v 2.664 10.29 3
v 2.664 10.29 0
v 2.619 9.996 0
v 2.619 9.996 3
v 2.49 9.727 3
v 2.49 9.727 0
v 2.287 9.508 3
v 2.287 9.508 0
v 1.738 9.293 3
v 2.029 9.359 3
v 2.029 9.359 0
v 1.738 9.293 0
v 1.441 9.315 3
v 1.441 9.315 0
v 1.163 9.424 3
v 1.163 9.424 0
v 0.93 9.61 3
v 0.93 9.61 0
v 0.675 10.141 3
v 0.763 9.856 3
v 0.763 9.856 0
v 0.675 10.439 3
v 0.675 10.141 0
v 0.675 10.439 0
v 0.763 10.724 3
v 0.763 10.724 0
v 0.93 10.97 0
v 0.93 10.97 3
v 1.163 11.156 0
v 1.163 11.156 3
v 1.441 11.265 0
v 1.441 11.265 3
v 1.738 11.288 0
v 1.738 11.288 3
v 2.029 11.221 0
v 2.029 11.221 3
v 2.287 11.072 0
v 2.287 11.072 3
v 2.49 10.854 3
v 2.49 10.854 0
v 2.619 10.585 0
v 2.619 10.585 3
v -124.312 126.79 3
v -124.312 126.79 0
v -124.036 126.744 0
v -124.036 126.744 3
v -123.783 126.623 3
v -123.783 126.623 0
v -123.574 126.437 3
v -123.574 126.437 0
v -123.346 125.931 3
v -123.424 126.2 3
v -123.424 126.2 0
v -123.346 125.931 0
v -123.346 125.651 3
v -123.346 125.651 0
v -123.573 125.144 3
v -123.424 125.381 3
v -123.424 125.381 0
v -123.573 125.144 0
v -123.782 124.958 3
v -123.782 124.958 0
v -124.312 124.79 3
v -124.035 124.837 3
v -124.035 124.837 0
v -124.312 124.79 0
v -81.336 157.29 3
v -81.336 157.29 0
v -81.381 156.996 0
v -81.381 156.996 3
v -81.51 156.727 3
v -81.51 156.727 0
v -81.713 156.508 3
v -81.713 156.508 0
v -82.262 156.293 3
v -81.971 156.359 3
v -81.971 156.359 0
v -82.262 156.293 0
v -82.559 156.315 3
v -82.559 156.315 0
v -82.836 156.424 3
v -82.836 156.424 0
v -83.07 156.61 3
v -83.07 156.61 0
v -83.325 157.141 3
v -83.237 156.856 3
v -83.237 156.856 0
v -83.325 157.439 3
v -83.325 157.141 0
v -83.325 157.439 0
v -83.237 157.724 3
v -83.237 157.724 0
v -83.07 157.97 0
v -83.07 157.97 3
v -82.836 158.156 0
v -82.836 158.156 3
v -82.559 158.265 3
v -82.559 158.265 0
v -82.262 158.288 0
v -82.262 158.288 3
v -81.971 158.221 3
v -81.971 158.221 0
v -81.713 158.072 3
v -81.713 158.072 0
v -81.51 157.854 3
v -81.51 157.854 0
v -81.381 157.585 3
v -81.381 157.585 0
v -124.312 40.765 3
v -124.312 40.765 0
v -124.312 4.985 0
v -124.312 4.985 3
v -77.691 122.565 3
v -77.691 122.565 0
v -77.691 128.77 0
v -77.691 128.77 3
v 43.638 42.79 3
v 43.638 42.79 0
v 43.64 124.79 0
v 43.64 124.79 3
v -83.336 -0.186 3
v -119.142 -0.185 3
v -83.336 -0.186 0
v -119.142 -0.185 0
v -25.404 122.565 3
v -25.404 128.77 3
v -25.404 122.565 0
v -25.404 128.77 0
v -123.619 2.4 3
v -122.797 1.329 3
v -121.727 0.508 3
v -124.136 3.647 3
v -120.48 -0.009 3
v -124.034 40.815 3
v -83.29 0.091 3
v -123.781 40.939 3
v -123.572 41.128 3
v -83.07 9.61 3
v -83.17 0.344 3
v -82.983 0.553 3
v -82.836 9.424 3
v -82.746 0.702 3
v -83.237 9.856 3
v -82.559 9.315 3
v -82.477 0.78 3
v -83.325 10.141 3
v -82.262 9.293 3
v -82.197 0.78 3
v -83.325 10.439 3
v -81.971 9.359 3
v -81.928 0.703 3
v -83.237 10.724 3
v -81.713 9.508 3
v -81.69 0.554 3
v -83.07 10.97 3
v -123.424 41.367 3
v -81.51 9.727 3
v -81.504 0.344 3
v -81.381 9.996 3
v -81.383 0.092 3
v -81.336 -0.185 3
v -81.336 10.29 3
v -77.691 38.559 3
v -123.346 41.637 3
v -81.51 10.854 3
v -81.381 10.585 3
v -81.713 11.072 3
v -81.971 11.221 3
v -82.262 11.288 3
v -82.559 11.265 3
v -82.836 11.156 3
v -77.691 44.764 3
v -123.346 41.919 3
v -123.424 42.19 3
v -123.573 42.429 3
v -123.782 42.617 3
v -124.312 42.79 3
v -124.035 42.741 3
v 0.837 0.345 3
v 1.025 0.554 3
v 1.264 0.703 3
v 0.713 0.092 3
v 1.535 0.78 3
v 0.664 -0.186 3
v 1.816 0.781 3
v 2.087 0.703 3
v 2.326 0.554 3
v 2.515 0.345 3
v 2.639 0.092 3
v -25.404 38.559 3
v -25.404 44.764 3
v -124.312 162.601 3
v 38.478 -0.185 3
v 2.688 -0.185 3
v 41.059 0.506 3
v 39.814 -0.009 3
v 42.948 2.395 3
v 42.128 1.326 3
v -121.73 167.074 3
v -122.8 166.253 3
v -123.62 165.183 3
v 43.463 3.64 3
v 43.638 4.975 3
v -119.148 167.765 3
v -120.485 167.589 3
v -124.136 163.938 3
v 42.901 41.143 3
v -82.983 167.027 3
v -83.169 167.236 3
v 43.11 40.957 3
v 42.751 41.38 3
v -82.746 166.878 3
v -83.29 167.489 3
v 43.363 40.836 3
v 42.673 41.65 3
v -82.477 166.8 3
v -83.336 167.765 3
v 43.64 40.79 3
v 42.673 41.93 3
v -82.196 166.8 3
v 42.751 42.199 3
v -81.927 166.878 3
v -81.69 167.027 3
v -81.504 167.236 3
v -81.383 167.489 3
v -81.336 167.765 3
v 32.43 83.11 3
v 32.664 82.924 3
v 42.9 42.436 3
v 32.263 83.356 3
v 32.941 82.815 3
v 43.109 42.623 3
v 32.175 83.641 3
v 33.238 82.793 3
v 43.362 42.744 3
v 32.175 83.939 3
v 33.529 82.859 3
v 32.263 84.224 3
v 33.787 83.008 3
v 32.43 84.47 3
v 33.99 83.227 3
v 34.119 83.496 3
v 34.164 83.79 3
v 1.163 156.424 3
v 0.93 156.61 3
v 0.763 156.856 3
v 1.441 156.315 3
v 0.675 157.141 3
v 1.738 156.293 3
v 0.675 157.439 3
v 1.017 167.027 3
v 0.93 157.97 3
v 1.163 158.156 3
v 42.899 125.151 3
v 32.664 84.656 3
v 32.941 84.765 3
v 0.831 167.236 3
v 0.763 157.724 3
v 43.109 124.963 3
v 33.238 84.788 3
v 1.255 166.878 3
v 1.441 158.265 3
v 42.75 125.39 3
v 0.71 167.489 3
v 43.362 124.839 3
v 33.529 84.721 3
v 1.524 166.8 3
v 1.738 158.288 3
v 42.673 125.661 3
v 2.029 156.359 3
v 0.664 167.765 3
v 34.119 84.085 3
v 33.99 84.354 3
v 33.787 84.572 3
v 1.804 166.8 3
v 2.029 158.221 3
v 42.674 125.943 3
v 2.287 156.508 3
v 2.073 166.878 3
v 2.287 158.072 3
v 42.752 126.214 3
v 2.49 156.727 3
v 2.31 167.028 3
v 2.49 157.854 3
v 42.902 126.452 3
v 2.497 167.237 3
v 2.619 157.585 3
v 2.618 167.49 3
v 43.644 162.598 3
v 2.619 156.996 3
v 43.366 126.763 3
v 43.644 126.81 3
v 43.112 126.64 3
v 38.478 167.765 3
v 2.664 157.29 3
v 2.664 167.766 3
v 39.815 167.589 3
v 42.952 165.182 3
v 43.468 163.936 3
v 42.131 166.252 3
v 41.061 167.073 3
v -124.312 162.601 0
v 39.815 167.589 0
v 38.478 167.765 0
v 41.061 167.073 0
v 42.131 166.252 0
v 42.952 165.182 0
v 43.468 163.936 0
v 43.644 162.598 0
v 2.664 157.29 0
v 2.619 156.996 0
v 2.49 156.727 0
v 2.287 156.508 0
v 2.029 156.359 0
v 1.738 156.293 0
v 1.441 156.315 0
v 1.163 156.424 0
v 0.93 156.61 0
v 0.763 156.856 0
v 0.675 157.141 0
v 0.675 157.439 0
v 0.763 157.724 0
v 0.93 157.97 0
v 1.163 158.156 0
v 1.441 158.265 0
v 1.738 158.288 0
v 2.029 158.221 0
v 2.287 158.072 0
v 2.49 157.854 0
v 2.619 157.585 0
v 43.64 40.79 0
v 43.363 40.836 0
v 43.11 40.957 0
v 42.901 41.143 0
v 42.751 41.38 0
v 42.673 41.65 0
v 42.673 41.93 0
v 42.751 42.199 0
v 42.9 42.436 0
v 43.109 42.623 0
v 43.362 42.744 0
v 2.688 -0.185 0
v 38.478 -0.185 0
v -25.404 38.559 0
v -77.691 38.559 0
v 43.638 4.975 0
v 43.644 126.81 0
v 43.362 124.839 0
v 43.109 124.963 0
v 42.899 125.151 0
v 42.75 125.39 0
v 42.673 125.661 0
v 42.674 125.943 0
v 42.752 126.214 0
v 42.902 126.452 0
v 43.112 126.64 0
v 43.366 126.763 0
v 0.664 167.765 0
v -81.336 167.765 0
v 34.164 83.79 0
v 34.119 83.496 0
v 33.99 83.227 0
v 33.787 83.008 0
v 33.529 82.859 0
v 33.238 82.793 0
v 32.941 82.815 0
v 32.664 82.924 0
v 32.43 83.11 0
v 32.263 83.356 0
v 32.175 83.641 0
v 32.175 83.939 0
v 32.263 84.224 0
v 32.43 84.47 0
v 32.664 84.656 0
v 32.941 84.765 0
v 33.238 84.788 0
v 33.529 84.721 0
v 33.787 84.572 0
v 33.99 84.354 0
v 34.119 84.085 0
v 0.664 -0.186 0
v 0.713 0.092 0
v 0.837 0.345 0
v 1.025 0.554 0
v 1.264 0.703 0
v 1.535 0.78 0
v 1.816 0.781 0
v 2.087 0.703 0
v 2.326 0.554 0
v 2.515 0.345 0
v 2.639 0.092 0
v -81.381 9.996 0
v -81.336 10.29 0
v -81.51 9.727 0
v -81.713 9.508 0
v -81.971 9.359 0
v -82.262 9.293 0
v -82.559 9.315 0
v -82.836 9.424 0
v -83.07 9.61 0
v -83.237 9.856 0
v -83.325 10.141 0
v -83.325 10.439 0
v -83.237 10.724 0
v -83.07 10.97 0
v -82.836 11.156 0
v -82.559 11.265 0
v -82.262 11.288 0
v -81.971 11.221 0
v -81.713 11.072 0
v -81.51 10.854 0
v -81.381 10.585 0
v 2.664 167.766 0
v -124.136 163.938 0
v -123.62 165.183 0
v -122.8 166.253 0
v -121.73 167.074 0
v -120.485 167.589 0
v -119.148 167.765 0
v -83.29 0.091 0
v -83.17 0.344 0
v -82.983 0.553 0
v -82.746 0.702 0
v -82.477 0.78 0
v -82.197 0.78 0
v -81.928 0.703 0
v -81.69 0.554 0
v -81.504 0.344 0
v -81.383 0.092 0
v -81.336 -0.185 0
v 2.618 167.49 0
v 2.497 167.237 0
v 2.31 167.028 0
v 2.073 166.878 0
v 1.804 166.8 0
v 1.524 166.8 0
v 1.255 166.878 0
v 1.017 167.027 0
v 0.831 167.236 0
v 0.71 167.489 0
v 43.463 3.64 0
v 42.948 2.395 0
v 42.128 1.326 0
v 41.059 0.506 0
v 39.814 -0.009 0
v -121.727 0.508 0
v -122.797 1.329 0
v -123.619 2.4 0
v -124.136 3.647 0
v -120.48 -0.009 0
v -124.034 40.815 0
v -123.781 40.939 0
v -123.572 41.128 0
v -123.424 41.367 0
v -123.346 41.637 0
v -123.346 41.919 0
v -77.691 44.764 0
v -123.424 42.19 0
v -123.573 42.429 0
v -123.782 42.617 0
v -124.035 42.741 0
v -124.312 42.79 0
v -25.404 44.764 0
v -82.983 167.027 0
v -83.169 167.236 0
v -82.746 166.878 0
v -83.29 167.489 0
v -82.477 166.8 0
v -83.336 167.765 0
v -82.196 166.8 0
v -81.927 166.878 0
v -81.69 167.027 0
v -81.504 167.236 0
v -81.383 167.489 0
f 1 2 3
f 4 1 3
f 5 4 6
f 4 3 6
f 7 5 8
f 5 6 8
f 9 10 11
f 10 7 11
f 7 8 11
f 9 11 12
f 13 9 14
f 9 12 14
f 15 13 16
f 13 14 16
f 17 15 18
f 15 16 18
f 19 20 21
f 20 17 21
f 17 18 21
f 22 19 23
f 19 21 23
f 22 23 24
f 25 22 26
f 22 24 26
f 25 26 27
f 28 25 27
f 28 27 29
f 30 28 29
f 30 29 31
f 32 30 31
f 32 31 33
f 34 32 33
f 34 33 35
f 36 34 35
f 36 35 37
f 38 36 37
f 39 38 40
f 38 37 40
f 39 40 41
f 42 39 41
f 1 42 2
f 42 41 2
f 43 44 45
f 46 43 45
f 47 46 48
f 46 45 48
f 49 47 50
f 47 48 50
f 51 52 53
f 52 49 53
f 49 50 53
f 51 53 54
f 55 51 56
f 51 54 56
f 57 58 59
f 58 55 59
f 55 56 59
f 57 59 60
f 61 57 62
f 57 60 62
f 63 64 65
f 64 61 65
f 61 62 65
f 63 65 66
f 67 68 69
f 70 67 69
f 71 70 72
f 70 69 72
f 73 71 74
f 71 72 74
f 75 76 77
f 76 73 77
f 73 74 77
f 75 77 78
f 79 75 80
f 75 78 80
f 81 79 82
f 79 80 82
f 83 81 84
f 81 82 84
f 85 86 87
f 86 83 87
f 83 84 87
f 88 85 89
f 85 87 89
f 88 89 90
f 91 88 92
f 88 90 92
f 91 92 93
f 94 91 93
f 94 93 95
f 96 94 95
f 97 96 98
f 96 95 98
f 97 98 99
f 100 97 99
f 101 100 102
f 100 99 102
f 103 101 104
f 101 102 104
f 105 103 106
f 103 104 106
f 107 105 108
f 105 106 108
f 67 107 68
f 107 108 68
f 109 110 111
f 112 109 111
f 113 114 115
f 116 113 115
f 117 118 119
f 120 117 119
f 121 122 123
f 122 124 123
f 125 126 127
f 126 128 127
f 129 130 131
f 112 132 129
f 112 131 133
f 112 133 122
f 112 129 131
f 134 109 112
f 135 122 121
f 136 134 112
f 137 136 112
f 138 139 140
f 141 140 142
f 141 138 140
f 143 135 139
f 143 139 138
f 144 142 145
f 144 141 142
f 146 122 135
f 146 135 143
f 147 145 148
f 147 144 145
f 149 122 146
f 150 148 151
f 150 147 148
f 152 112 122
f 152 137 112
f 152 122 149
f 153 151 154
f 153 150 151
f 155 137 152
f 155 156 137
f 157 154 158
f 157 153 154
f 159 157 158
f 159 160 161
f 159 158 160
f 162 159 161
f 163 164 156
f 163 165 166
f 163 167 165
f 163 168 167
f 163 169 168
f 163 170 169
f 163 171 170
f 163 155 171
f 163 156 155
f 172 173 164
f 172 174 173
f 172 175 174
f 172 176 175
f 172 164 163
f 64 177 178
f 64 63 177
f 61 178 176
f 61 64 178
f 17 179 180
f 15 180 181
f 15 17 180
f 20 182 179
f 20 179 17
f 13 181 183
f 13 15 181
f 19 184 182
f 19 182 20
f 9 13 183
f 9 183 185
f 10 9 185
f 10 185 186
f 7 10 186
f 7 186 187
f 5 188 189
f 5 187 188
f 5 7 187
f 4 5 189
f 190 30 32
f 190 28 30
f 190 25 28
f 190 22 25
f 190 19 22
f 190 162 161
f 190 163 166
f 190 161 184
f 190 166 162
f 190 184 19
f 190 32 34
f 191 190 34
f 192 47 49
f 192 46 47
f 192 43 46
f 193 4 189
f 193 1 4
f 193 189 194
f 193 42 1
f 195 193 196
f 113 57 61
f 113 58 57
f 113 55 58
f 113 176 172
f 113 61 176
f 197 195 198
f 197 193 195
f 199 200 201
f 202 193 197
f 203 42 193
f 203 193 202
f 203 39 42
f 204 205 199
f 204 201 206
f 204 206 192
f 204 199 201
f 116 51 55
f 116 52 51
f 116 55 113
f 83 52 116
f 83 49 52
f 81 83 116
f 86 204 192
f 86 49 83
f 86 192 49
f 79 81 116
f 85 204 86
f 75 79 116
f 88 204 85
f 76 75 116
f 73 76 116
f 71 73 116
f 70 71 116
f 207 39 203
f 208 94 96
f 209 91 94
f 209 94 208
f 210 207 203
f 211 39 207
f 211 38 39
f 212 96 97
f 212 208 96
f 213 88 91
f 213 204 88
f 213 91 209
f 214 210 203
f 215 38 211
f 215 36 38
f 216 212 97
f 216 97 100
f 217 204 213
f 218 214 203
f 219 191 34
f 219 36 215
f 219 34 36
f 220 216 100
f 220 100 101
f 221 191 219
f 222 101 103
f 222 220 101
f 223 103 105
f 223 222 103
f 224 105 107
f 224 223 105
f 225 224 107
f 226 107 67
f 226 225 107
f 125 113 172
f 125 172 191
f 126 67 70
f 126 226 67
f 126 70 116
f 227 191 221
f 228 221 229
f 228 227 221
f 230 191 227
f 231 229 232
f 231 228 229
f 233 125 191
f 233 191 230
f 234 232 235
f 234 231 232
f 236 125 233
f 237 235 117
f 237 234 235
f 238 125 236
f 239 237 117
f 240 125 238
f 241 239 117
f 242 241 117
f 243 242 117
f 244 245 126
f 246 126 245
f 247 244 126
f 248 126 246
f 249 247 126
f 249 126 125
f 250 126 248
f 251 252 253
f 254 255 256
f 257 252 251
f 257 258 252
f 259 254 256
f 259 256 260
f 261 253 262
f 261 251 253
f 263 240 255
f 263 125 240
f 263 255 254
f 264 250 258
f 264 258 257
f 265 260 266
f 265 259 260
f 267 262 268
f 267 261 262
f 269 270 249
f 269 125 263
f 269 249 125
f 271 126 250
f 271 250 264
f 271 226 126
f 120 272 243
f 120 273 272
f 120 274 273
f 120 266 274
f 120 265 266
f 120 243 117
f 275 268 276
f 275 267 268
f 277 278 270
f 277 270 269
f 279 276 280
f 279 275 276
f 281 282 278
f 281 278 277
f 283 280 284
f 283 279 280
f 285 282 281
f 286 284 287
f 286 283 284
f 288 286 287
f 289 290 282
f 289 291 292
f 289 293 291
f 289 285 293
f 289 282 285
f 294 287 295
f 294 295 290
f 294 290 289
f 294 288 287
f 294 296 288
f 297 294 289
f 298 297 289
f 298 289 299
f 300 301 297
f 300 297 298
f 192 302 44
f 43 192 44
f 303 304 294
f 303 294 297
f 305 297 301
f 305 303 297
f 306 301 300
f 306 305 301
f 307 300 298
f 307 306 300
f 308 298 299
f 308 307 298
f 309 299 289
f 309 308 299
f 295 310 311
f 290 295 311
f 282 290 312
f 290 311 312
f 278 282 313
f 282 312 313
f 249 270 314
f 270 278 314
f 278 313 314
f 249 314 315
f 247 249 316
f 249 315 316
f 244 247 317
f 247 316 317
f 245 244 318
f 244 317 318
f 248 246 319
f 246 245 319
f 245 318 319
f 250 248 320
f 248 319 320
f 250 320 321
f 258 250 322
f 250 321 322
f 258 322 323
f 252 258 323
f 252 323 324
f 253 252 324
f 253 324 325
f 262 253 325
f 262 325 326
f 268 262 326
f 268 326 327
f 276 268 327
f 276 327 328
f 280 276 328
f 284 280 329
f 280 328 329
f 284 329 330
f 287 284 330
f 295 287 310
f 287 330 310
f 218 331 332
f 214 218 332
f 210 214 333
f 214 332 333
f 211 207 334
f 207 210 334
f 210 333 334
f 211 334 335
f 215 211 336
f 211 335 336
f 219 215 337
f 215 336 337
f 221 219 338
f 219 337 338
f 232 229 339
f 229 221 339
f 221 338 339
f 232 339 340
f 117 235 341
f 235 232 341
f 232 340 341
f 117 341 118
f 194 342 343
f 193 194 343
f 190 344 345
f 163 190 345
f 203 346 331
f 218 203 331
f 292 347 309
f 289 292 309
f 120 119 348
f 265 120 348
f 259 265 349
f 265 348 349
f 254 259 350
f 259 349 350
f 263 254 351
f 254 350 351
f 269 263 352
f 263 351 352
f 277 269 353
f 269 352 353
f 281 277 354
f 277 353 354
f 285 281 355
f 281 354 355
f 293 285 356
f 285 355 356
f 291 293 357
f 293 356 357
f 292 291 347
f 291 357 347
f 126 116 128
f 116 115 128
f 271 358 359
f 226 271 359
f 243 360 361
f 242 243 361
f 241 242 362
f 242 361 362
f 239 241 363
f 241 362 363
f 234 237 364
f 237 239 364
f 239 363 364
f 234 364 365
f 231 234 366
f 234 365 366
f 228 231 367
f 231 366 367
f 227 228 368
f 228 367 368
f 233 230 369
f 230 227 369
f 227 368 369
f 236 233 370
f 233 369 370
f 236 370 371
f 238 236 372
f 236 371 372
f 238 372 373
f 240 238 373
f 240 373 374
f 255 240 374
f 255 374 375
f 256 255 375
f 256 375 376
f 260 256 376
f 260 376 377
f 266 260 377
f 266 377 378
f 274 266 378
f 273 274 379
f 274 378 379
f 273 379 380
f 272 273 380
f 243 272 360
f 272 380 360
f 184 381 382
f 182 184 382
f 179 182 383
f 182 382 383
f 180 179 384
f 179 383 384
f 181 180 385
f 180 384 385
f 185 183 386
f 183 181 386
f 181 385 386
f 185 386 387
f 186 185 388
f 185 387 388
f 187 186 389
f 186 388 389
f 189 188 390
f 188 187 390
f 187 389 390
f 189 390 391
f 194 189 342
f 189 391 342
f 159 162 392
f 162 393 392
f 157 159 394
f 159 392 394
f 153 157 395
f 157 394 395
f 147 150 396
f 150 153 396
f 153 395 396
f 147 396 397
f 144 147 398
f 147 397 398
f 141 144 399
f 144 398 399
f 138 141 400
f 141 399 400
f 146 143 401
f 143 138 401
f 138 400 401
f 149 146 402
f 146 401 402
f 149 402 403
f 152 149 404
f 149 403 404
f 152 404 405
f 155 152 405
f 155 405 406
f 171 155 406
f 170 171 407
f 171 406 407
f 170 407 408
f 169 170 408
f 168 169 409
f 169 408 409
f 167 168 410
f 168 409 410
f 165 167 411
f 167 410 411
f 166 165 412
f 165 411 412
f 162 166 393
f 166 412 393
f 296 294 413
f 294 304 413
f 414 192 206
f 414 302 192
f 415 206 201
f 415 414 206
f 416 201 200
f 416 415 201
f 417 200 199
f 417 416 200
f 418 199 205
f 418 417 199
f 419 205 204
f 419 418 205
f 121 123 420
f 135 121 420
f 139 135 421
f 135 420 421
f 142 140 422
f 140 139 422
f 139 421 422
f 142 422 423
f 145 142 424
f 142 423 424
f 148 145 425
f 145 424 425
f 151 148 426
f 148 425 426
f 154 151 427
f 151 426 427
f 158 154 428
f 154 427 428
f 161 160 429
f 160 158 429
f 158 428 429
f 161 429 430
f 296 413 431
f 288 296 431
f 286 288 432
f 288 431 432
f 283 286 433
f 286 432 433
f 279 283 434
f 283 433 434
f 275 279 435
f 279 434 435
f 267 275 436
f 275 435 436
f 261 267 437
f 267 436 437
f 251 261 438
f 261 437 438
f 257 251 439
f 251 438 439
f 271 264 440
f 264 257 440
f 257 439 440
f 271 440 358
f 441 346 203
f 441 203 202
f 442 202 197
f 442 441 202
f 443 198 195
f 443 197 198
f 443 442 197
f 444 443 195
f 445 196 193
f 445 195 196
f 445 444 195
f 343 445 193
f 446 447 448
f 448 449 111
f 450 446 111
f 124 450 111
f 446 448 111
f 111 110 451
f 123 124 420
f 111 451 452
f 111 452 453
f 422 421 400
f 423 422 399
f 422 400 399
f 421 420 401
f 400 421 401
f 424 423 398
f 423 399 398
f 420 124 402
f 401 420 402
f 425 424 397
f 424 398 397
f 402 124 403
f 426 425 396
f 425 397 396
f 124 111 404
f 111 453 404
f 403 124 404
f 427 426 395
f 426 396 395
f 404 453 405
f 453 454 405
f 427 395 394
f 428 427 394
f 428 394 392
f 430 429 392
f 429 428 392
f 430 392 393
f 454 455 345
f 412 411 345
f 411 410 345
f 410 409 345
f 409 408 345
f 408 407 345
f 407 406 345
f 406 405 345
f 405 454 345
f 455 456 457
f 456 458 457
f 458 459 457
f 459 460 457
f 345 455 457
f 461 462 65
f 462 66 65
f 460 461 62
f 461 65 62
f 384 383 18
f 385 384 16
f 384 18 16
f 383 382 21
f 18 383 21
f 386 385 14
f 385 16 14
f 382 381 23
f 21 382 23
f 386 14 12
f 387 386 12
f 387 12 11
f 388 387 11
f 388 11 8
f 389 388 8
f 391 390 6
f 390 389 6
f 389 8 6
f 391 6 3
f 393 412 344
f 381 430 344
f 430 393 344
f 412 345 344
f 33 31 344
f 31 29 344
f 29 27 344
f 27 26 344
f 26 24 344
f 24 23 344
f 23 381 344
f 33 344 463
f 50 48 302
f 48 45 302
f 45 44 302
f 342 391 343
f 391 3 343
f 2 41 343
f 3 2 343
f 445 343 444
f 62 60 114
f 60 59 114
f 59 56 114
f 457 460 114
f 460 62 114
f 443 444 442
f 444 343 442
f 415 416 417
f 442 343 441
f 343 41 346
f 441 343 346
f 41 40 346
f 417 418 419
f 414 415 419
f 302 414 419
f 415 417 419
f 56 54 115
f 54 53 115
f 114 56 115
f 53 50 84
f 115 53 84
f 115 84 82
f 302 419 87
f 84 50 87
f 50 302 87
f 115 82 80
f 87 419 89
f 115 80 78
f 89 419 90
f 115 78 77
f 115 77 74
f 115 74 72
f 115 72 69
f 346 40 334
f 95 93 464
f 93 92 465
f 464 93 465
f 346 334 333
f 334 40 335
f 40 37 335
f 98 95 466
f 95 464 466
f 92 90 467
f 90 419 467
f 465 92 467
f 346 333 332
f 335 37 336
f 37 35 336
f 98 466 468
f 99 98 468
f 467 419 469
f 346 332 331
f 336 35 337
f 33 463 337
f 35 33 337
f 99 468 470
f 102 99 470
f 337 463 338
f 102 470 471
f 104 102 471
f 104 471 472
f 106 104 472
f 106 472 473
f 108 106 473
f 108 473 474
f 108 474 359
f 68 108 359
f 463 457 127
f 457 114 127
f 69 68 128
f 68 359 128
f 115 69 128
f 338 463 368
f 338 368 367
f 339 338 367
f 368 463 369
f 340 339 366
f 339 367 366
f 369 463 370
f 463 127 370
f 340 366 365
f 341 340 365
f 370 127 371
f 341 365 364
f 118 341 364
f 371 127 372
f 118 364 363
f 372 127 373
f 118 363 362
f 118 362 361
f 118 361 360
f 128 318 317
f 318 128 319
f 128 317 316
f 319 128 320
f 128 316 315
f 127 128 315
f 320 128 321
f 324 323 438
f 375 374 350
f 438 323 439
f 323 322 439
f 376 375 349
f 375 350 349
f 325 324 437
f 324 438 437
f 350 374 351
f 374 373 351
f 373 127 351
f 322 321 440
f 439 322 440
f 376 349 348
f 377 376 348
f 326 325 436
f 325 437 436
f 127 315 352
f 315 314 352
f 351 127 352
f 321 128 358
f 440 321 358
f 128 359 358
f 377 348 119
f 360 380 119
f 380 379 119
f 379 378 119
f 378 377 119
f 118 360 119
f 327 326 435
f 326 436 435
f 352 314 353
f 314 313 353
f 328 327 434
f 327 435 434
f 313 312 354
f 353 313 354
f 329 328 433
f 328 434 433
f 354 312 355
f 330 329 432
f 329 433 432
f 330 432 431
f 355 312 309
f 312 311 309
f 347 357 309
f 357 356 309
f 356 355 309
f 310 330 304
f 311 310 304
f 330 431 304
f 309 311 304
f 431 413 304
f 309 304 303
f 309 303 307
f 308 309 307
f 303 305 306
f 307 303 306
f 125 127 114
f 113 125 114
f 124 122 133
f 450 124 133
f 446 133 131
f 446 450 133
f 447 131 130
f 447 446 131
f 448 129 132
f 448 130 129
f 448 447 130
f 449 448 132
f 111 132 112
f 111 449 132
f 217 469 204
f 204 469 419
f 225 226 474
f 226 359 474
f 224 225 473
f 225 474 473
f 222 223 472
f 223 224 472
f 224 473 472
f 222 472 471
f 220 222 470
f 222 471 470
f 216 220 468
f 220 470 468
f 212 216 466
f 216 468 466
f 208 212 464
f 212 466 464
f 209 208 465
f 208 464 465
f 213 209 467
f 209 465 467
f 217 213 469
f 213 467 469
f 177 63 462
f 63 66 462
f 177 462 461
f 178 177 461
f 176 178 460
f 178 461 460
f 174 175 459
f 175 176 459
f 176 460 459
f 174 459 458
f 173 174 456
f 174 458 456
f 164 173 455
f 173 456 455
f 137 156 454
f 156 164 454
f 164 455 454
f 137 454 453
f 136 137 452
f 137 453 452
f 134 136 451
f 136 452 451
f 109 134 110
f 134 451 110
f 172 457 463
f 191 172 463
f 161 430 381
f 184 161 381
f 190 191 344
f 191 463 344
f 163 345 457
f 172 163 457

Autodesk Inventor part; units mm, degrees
ref_plane "YZ Plane" through (0, 0, 0) normal (1, 0, 0) x (0, 1, 0)
ref_plane "XZ Plane" through (0, 0, 0) normal (0, 1, 0) x (-1, 0, 0)
ref_plane "XY Plane" through (0, 0, 0) normal (0, 0, 1) x (1, 0, 0)
sketch "Sketch1" plane through (-41.0022, 83.9754, 0) normal (0, 0, 1) x (1, 0, 0)
  line L0 (43.6907, -84.1601) -> (79.4807, -84.1601)
  arc A0 (43.6907, -84.1601) -> (41.6657, -84.1611) centre (42.6783, -84.1982) ccw
  line L1 (-40.3343, -84.1601) -> (41.6657, -84.1611)
  arc A1 (-40.3343, -84.1601) -> (-42.3343, -84.1611) centre (-41.3342, -84.1854) ccw
  line L2 (-78.1393, -84.1601) -> (-42.3343, -84.1611)
  arc A2 (-83.3093, -78.9901) -> (-78.1393, -84.1601) centre (-78.1401, -78.9909) ccw
  line L3 (-83.3093, -43.2101) -> (-83.3093, -78.9901)
  arc A3 (-83.3093, -43.2101) -> (-83.3103, -41.1851) centre (-83.3474, -42.1976) ccw
  line L4 (-83.3093, 40.8149) -> (-83.3103, -41.1851)
  arc A4 (-83.3093, 40.8149) -> (-83.3103, 42.8149) centre (-83.3346, 41.8149) ccw
  line L5 (-83.3093, 78.6259) -> (-83.3103, 42.8149)
  arc A5 (-78.1463, 83.7899) -> (-83.3093, 78.6259) centre (-78.147, 78.6276) ccw
  line L6 (-42.3343, 83.7899) -> (-78.1463, 83.7899)
  arc A6 (-42.3343, 83.7899) -> (-40.3343, 83.7899) centre (-41.3343, 83.8153) ccw
  line L7 (41.6657, 83.7899) -> (-40.3343, 83.7899)
  arc A7 (41.6657, 83.7899) -> (43.6657, 83.7909) centre (42.6657, 83.8152) ccw
  line L8 (79.4797, 83.7899) -> (43.6657, 83.7909)
  arc A8 (84.6457, 78.6229) -> (79.4797, 83.7899) centre (79.48, 78.6242) ccw
  line L9 (84.6457, 42.8349) -> (84.6457, 78.6229)
  arc A9 (84.6457, 42.8349) -> (84.6417, 40.8149) centre (84.6762, 41.8249) ccw
  line L10 (84.6407, -41.1851) -> (84.6417, 40.8149)
  arc A10 (84.6407, -41.1851) -> (84.6417, -43.1851) centre (84.666, -42.1851) ccw
  line L11 (84.6407, -79.0001) -> (84.6417, -43.1851)
  arc A11 (79.4807, -84.1601) -> (84.6407, -79.0001) centre (79.4819, -79.0012) ccw
  circle A12 centre (42.6657, 73.3149) radius 1
  circle A13 centre (-41.3343, 73.3149) radius 1
  circle A14 centre (-41.3343, -73.6851) radius 1
  circle A15 centre (42.6657, -73.6851) radius 1
  circle A16 centre (74.1657, -0.1851) radius 1
  line L12 (15.5981, 38.5892) -> (-36.6892, 38.5892)
  line L13 (-36.6892, 38.5892) -> (-36.6892, 44.7944)
  line L14 (-36.6892, 44.7944) -> (15.5981, 44.7944)
  line L15 (15.5981, 44.7944) -> (15.5981, 38.5892)
  line L16 (15.5981, -45.4168) -> (-36.6892, -45.4168)
  line L17 (-36.6892, -45.4168) -> (-36.6892, -39.2116)
  line L18 (-36.6892, -39.2116) -> (15.5981, -39.2116)
  line L19 (15.5981, -39.2116) -> (15.5981, -45.4168)
  point P0 (0.6657, -0.1851)
  point P1 (-10.5892, -42.205)
  point P2 (-10.5892, 41.801)
  point P3 (-10.5892, -42.205)
extrude "Extrusion1" add sketch "Sketch1" along normal blind 3
properties part number "PCB Protector for Small Board" material "Glass"
